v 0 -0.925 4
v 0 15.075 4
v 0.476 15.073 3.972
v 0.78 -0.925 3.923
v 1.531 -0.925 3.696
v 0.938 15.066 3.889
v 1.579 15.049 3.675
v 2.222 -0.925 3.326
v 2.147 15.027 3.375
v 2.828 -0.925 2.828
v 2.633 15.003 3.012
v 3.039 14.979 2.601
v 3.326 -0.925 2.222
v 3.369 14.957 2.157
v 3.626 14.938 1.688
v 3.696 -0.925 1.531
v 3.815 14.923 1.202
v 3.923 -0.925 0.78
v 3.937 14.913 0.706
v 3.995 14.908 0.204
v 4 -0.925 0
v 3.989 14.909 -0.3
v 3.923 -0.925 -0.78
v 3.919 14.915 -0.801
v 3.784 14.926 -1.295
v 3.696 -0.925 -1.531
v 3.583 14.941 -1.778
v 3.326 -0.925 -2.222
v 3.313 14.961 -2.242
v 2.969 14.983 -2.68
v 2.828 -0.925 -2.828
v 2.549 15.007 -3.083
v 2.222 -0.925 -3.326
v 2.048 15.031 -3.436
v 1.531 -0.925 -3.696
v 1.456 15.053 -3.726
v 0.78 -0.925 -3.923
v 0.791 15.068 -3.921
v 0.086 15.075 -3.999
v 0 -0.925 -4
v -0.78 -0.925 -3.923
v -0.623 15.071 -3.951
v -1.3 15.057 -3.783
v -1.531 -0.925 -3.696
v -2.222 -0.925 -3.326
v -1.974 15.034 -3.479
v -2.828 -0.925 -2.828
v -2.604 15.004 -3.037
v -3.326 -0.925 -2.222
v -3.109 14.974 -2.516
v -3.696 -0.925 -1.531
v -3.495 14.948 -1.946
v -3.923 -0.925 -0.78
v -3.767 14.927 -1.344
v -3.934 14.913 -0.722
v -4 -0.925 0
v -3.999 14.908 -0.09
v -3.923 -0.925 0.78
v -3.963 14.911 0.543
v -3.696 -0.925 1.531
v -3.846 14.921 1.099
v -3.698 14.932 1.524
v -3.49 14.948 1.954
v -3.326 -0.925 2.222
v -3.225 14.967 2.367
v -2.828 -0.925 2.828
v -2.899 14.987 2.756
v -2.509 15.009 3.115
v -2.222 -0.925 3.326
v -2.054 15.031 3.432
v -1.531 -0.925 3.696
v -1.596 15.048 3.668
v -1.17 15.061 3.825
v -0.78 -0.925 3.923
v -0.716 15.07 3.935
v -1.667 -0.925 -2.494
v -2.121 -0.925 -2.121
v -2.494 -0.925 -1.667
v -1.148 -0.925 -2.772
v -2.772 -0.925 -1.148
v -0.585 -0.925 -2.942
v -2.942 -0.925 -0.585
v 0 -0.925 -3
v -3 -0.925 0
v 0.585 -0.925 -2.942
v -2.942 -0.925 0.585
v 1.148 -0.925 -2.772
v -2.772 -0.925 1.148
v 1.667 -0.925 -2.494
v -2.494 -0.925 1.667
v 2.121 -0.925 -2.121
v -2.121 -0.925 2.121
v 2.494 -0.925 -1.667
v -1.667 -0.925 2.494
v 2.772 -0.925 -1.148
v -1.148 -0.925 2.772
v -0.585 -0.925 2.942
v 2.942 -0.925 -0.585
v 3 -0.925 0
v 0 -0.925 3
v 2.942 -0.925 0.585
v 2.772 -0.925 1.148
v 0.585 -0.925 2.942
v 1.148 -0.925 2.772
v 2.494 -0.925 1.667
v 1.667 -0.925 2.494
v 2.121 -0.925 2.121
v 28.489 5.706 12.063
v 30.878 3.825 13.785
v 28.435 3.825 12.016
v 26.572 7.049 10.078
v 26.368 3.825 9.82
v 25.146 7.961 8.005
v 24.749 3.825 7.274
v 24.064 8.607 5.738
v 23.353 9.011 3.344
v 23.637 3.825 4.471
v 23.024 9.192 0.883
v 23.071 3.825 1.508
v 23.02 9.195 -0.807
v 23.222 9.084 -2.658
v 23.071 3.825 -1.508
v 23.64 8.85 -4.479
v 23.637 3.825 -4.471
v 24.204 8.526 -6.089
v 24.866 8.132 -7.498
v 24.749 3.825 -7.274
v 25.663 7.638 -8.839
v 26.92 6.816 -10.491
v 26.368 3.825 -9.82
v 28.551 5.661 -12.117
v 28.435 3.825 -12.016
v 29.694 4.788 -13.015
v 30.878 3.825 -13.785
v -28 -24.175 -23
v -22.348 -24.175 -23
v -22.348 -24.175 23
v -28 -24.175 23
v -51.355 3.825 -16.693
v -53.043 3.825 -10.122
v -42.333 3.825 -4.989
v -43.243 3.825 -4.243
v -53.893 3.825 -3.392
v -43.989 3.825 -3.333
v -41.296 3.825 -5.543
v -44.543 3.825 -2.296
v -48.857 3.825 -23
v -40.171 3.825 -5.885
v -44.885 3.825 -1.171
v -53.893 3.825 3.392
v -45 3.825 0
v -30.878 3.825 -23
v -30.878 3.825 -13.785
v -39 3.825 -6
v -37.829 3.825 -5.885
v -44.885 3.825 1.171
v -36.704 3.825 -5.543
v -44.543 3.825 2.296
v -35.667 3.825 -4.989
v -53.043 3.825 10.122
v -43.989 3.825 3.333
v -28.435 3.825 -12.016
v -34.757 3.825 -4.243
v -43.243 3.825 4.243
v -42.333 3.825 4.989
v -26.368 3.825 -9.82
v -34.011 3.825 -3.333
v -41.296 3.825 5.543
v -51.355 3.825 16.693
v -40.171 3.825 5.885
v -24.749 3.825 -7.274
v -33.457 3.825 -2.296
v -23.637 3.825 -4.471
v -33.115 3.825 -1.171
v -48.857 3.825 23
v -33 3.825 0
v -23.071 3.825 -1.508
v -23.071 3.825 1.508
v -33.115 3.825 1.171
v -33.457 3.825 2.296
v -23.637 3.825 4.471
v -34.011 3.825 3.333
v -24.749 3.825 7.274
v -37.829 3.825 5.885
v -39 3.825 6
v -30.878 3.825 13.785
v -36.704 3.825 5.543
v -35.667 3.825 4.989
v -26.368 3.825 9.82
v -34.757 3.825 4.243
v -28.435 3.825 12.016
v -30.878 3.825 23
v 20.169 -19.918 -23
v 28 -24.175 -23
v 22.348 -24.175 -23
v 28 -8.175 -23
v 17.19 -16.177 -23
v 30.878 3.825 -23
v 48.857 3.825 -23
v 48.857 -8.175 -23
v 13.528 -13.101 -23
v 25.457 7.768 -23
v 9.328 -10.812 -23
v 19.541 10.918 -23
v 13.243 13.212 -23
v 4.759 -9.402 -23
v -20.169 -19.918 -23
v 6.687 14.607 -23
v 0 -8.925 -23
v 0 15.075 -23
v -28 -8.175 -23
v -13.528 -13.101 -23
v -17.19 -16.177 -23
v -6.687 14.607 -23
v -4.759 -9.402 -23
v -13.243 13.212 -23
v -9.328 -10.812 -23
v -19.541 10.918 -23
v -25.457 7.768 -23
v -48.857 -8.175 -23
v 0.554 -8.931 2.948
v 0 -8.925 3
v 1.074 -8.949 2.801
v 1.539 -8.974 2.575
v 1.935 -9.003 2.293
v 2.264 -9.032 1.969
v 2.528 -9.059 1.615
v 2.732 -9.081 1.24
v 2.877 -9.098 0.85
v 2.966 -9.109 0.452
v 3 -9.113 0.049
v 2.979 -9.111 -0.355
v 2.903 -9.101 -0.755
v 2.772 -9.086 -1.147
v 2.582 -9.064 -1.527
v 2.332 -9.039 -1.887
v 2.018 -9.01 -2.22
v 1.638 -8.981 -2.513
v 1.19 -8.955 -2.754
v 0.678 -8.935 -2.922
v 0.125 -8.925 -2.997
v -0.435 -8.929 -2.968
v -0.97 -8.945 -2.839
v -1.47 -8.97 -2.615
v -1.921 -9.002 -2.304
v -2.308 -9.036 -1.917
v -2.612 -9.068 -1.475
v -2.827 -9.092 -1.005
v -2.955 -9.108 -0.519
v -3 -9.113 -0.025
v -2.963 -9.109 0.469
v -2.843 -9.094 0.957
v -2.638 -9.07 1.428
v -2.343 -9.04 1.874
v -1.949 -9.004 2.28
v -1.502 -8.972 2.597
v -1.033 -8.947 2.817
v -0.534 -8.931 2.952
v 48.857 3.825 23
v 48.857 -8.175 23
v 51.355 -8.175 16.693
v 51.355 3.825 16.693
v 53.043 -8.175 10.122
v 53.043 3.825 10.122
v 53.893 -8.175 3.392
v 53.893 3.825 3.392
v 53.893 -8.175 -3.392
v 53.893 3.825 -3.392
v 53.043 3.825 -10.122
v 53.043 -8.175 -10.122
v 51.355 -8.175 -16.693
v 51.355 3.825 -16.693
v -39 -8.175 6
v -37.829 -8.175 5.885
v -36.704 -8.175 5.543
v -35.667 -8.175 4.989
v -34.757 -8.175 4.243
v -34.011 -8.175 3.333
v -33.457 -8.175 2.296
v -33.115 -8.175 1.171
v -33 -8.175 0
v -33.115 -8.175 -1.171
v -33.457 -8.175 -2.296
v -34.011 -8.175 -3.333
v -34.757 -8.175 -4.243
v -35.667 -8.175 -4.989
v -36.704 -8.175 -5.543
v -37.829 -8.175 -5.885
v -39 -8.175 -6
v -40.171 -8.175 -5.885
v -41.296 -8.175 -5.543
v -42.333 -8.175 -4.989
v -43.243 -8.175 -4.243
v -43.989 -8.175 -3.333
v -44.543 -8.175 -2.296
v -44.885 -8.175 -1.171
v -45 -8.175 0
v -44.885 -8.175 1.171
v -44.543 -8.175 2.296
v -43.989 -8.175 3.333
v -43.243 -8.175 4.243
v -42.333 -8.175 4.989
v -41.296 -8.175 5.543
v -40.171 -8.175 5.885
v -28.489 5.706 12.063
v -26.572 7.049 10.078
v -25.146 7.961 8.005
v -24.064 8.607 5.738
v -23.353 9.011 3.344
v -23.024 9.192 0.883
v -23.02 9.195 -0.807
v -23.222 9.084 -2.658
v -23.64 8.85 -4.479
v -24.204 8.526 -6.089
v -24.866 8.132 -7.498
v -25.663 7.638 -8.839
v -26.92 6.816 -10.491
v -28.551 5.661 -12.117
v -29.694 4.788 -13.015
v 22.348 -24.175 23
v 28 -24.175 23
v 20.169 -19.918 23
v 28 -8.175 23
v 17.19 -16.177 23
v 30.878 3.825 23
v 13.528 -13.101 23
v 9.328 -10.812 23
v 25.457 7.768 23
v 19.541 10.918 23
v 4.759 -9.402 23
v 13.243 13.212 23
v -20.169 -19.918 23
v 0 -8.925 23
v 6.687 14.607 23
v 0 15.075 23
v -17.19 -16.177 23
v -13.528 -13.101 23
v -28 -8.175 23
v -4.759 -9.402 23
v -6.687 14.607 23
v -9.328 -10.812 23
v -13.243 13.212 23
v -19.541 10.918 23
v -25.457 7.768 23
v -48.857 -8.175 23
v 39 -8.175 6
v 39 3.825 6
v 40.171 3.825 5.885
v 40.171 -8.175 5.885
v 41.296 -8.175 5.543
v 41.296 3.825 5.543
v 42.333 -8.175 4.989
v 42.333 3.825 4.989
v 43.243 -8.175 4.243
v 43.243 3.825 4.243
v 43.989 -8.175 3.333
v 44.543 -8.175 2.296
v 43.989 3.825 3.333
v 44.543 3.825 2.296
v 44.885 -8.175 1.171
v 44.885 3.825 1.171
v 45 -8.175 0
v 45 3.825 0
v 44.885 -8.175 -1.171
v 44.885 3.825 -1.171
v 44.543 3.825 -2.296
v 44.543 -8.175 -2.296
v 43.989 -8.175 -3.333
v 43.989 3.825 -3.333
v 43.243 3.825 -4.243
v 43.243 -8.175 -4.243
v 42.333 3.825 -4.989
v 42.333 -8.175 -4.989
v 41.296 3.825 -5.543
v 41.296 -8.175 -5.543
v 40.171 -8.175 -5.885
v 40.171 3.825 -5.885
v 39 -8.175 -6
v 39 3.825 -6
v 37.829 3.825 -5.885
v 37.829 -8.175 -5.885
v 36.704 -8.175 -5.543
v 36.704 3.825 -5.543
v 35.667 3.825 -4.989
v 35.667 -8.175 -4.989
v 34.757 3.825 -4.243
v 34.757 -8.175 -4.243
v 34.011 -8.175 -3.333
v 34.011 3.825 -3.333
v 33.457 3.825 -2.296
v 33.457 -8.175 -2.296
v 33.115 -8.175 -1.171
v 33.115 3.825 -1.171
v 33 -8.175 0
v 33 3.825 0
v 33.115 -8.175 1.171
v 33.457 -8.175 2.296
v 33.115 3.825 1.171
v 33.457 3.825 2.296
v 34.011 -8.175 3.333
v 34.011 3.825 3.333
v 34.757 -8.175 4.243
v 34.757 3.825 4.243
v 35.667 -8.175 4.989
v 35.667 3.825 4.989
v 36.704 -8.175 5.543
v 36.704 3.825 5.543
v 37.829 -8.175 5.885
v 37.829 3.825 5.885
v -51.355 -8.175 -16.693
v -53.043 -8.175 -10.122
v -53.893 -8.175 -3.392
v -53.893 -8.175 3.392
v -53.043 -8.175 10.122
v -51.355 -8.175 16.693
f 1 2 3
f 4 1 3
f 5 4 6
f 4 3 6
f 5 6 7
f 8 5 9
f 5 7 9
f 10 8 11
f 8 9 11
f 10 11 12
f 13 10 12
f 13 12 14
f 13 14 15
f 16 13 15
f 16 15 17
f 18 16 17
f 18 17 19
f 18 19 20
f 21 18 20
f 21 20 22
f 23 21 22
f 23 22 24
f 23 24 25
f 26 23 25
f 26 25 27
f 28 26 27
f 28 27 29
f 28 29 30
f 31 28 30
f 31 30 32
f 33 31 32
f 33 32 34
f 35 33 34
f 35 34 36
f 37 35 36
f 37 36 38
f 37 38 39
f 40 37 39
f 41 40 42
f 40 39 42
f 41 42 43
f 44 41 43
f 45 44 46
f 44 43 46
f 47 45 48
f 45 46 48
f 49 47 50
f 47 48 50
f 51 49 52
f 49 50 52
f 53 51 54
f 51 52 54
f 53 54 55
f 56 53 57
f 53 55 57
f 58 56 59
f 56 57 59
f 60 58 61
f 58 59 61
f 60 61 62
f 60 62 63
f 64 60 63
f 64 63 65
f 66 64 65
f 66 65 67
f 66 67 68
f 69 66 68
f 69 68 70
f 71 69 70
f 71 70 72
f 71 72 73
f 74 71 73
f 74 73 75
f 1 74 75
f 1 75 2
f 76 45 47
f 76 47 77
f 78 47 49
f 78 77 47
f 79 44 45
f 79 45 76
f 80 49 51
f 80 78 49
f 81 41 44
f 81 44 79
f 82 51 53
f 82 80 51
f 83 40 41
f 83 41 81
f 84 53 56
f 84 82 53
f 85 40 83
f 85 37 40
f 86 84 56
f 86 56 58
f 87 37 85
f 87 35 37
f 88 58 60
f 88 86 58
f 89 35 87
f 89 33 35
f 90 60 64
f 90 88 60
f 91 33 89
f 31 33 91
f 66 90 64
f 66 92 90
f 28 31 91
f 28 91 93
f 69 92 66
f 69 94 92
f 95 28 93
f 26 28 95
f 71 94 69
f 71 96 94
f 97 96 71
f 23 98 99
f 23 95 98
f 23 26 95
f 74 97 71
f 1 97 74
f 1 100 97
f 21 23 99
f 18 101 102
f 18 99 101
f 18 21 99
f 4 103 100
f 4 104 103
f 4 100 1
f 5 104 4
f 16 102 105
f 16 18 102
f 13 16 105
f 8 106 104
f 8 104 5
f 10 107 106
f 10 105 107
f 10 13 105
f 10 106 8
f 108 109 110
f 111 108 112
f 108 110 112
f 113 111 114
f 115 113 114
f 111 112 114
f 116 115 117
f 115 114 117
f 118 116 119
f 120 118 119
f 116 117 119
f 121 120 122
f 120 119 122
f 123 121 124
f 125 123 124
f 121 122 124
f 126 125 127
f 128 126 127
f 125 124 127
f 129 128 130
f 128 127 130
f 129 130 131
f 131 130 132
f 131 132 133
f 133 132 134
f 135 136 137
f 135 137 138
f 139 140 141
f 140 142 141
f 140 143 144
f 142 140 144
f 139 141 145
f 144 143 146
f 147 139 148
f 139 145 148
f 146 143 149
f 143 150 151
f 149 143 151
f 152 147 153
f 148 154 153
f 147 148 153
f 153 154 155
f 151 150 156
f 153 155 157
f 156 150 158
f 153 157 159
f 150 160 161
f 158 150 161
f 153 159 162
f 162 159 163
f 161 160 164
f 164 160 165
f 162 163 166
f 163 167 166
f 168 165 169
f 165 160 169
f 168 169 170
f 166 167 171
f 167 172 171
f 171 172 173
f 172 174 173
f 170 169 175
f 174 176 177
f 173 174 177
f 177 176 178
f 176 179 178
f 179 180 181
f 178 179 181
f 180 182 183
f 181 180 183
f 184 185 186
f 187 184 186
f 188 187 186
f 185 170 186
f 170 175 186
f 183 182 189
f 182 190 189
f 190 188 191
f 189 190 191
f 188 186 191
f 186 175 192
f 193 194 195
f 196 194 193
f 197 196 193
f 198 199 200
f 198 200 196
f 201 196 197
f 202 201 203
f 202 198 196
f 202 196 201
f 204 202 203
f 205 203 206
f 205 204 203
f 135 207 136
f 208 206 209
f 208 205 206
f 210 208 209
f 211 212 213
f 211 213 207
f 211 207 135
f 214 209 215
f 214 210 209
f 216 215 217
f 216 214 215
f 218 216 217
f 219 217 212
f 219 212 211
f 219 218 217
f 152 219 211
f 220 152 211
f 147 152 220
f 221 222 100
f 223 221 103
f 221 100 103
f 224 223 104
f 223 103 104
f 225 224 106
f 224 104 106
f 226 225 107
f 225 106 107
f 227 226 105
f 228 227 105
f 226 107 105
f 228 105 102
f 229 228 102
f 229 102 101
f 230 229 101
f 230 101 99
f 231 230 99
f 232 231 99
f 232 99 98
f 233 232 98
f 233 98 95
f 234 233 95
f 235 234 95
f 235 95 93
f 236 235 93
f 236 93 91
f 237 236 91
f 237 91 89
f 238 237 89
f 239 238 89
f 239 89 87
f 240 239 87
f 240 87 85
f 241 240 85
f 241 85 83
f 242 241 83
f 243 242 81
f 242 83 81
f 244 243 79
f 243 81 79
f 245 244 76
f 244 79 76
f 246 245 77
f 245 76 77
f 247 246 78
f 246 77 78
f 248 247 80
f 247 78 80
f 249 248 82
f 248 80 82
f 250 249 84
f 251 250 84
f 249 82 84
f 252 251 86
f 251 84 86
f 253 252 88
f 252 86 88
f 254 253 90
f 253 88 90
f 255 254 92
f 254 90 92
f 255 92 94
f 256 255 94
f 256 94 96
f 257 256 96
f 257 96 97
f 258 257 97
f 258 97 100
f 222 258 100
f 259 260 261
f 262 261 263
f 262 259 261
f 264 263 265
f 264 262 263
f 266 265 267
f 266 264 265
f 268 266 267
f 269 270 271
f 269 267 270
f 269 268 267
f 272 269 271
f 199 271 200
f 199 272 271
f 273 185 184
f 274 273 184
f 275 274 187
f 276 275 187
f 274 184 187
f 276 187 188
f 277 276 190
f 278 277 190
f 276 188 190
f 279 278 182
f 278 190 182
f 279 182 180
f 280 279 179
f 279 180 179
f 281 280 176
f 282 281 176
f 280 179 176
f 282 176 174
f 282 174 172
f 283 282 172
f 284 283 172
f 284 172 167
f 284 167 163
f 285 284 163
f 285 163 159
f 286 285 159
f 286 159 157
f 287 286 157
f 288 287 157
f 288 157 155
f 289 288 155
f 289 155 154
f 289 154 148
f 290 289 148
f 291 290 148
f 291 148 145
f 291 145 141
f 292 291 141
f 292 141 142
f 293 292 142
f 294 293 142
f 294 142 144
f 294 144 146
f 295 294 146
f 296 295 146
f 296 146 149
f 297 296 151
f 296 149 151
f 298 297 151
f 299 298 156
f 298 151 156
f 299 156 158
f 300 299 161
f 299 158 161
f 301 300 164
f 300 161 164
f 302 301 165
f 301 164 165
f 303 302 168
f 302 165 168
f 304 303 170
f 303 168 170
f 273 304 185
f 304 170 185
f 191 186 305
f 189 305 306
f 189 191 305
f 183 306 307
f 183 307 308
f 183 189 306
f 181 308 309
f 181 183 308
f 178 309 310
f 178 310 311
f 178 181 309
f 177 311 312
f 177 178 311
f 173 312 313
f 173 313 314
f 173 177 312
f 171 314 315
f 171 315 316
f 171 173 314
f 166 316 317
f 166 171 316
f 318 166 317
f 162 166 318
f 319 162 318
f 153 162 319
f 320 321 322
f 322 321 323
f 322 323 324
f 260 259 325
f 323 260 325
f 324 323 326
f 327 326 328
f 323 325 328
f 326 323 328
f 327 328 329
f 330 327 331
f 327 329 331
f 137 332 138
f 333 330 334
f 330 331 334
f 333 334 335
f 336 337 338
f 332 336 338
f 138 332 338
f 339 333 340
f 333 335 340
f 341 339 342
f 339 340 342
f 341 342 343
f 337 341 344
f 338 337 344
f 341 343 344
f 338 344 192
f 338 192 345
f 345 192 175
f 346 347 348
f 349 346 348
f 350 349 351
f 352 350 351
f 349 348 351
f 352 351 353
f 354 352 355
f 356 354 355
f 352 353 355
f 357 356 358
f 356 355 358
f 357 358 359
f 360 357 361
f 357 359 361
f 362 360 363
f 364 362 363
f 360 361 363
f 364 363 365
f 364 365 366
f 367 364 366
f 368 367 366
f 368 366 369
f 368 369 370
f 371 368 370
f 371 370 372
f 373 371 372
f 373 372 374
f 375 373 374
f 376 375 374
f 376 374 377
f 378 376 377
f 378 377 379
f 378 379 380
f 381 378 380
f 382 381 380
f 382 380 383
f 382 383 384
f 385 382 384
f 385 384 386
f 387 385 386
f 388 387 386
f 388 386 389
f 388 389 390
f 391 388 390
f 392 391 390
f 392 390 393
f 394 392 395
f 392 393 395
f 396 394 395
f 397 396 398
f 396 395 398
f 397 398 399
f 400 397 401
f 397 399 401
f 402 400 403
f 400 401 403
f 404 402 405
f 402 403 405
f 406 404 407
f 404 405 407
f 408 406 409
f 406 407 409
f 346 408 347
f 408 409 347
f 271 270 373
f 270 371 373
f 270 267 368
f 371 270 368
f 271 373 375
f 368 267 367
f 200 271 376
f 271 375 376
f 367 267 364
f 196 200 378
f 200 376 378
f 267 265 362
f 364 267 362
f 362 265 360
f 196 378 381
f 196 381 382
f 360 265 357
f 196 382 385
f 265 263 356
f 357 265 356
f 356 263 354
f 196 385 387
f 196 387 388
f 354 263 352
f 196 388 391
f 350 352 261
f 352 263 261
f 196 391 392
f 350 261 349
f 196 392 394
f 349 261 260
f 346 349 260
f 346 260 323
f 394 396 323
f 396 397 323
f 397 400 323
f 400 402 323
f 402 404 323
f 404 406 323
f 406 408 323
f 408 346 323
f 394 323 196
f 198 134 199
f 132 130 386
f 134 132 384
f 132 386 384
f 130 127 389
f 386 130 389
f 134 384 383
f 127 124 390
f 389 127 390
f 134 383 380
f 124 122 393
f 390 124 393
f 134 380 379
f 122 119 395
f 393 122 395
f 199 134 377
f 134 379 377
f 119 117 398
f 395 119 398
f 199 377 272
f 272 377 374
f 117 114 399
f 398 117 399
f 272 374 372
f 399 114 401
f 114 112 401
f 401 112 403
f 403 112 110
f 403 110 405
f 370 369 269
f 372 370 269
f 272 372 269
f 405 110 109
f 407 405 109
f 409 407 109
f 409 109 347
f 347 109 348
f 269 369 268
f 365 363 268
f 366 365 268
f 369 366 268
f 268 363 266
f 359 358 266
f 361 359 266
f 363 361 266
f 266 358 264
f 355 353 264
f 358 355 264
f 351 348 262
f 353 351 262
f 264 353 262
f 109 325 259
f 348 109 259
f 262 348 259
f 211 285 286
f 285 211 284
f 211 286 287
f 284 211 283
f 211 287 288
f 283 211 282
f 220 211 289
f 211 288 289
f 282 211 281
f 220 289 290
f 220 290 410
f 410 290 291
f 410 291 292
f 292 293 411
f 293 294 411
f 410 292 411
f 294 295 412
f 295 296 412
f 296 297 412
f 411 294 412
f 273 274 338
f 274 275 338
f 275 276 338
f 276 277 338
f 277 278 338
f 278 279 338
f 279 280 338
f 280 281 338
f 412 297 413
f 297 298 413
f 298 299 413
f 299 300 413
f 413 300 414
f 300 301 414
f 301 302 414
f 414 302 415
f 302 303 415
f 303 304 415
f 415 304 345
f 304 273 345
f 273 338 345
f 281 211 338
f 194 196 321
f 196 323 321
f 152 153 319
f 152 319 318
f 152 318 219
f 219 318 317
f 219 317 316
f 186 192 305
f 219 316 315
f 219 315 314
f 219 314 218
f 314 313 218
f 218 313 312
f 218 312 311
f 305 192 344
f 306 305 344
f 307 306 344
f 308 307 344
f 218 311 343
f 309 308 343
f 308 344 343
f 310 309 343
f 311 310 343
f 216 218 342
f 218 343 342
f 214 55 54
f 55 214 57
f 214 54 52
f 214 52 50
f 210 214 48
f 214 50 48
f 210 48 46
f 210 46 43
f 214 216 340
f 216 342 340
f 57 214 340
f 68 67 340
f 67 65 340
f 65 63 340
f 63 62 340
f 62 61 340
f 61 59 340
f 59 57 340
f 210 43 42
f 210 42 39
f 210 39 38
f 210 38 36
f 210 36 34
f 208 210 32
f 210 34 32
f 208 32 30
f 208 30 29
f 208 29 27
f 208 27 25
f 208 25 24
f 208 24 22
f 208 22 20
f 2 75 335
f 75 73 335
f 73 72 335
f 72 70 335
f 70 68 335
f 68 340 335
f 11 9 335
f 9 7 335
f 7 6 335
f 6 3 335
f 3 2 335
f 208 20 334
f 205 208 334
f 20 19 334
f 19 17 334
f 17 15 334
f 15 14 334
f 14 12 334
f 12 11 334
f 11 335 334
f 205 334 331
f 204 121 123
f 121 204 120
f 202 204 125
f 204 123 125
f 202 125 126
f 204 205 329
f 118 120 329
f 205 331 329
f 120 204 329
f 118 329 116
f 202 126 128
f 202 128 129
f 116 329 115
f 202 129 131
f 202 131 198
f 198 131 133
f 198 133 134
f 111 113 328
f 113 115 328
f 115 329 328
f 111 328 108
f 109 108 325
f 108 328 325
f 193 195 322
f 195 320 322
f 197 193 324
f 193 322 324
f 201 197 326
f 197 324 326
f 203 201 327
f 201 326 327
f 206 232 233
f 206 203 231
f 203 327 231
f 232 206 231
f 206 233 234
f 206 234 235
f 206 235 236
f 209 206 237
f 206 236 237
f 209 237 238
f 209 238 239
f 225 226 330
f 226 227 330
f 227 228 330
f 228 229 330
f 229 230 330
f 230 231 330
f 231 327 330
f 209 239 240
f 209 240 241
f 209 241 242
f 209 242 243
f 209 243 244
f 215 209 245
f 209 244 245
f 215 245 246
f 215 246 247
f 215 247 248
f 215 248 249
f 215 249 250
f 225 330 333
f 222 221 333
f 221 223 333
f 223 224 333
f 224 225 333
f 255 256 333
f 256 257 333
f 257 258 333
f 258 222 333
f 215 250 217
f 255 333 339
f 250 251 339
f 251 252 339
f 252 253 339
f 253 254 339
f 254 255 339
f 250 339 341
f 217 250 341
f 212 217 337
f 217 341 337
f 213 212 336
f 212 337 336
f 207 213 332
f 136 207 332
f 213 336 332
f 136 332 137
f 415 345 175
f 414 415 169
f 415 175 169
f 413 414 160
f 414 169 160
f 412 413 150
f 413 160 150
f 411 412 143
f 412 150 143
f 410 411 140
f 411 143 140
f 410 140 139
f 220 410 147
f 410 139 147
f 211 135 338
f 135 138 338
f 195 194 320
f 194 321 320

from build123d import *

# Parameters (mm, degrees)
BOSS_EXTRUDE1_DEPTH = 23
CUT_EXTRUDE1_DEPTH  = 46
SKETCH4_R           = 6
CUT_EXTRUDE2_DEPTH  = 46
CUT_EXTRUDE3_DEPTH  = 46
SKETCH6_R           = 4
CUT_EXTRUDE4_DEPTH  = 16
SKETCH7_R           = 3
CUT_EXTRUDE5_DEPTH  = 71.608515808


with BuildPart() as part:
    # Sketch1 → Boss-Extrude1 (new, symmetric)
    with BuildSketch(Plane.XY):
        with BuildLine():
            Line((-54, 3.825), (-30.877783275, 3.825))
            ThreePointArc((-30.877783275, 3.825), (0, 15.075), (30.877783275, 3.825))
            Line((30.877783275, 3.825), (54, 3.825))
            Line((54, 3.825), (54, -8.175))
            Line((54, -8.175), (28, -8.175))
            Line((28, -8.175), (28, -24.175))
            Line((28, -24.175), (22.348098353, -24.175))
            ThreePointArc((22.348098353, -24.175), (0, -8.925), (-22.348098353, -24.175))
            Line((-22.348098353, -24.175), (-28, -24.175))
            Line((-28, -24.175), (-28, -8.175))
            Line((-28, -8.175), (-54, -8.175))
            Line((-54, -8.175), (-54, 3.825))
        make_face()
    extrude(amount=BOSS_EXTRUDE1_DEPTH, both=True)

    # Sketch2 → Cut-Extrude1 (cut)
    with BuildSketch(Plane(origin=(0, 3.825, 0), x_dir=(1, 0, 0), z_dir=(0, 1, 0))):
        with BuildLine():
            ThreePointArc((48.856934001, -23), (54, 0), (48.856934001, 23))
            Line((48.856934001, 23), (54, 23))
            Line((54, 23), (85.001299568, 23))
            Line((85.001299568, 23), (85.001299568, -23))
            Line((85.001299568, -23), (54, -23))
            Line((54, -23), (48.856934001, -23))
        make_face()
        with BuildLine():
            Line((-48.856934001, 23), (-68.265292399, 23))
            Line((-68.265292399, 23), (-68.265292399, -23))
            Line((-68.265292399, -23), (-54, -23))
            Line((-54, -23), (-48.856934001, -23))
            ThreePointArc((-48.856934001, -23), (-54, 0), (-48.856934001, 23))
        make_face()
    extrude(amount=-CUT_EXTRUDE1_DEPTH, mode=Mode.SUBTRACT)

    # Sketch4 → Cut-Extrude2 (cut)
    with BuildSketch(Plane(origin=(0, 3.825, 0), x_dir=(1, 0, 0), z_dir=(0, 1, 0))):
        with Locations(Location((-39, 0, 0), (0, 0, 270))):
            Circle(SKETCH4_R)
        with Locations(Location((39, 0, 0), (0, 0, 270))):
            Circle(SKETCH4_R)
    extrude(amount=-CUT_EXTRUDE2_DEPTH, mode=Mode.SUBTRACT)

    # Sketch5 → Cut-Extrude3 (cut)
    with BuildSketch(Plane(origin=(0, 3.825, 0), x_dir=(1, 0, 0), z_dir=(0, 1, 0))):
        with BuildLine():
            Line((-30.877783275, 13.785122251), (-30.877783275, -13.785122251))
            ThreePointArc((-30.877783275, -13.785122251), (-23, 0), (-30.877783275, 13.785122251))
        make_face()
        with BuildLine():
            Line((30.877783275, 13.785122251), (30.877783275, -13.785122251))
            ThreePointArc((30.877783275, -13.785122251), (23, 0), (30.877783275, 13.785122251))
        make_face()
    extrude(amount=CUT_EXTRUDE3_DEPTH, mode=Mode.SUBTRACT)

    # Sketch6 → Cut-Extrude4 (cut)
    with BuildSketch(Plane(origin=(0, 15.075, 0), x_dir=(1, 0, 0), z_dir=(0, 1, 0))):
        with Locations(Location((0, 0, 0), (0, 0, 270))):
            Circle(SKETCH6_R)
    extrude(amount=-CUT_EXTRUDE4_DEPTH, mode=Mode.SUBTRACT)

    # Sketch7 → Cut-Extrude5 (cut, through all)
    with BuildSketch(Plane(origin=(0, 15.075, 0), x_dir=(1, 0, 0), z_dir=(0, 1, 0))):
        with Locations(Location((0, 0, 0), (0, 0, 270))):
            Circle(SKETCH7_R)
    extrude(amount=-CUT_EXTRUDE5_DEPTH, mode=Mode.SUBTRACT)


solid = part.part
